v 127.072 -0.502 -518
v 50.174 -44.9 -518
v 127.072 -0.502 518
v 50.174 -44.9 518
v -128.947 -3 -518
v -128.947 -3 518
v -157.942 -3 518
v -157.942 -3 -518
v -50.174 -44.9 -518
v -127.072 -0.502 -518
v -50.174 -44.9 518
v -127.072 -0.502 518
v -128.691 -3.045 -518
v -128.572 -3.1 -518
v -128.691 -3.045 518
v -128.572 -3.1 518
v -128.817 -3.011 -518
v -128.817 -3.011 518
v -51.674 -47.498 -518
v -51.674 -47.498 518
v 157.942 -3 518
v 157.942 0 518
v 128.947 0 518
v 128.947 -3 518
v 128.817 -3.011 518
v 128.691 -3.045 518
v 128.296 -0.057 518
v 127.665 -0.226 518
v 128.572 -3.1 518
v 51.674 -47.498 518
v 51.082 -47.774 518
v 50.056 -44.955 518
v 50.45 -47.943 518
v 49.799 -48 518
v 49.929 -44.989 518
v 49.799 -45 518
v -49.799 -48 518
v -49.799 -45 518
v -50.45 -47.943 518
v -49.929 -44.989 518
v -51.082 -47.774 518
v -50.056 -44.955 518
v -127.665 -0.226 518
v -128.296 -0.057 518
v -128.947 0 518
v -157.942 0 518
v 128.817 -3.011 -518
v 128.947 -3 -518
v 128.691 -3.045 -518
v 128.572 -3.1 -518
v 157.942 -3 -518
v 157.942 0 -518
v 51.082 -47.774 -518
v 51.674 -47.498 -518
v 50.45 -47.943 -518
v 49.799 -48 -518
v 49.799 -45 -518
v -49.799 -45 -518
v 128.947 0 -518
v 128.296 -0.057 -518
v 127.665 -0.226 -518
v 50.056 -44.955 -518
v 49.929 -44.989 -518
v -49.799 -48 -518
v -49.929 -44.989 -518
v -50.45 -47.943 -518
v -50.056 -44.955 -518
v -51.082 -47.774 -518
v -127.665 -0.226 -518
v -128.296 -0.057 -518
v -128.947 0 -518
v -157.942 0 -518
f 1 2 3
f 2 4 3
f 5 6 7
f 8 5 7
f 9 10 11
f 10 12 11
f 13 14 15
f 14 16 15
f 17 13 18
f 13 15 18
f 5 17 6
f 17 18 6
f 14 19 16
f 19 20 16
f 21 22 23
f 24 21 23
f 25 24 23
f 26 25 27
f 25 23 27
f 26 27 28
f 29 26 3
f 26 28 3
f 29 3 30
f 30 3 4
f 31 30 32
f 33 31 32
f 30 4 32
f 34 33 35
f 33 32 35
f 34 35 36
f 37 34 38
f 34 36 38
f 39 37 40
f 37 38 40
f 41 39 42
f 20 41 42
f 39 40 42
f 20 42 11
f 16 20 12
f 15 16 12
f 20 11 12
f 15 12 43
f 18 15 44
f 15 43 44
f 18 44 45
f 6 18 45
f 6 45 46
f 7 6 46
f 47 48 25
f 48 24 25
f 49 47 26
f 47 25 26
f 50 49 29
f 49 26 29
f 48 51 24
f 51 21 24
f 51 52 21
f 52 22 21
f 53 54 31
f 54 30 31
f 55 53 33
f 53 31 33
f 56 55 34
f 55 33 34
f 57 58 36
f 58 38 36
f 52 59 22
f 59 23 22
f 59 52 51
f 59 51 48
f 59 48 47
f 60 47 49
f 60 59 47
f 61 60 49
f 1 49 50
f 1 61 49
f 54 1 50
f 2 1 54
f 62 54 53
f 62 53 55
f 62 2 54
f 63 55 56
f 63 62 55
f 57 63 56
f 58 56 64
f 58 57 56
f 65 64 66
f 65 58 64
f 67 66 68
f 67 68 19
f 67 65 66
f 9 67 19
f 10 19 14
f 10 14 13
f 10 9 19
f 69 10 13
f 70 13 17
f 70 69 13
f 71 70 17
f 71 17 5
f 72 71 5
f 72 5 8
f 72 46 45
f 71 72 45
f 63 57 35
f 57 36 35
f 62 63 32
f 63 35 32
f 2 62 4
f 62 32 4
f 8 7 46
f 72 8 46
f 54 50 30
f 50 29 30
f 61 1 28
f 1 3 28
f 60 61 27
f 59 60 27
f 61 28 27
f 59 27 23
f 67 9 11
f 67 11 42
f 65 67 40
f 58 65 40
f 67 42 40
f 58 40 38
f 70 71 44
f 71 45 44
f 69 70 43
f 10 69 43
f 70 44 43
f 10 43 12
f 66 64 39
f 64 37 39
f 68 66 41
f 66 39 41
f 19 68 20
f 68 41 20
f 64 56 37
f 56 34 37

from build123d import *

# Parameters (mm, degrees)
SM_BASE_FLANGE_1_DEPTH = 518


# Sheet-metal steps are written as plain solids
with BuildPart() as part:
    # Sketch 1 → Базовая кромка1 (new body)
    with BuildSketch(Plane.XY):
        with BuildLine():
            Line((-157.942286341, 0), (-128.947095812, 0))
            ThreePointArc((-128.947095812, 0), (-127.976524393, -0.127778151), (-127.072095812, -0.502404736))
            Line((-127.072095812, -0.502404736), (-50.174038106, -44.899519053))
            ThreePointArc((-50.174038106, -44.899519053), (-49.99315239, -44.97444437), (-49.799038106, -45))
            Line((-49.799038106, -45), (49.799038106, -45))
            ThreePointArc((49.799038106, -45), (49.99315239, -44.97444437), (50.174038106, -44.899519053))
            Line((50.174038106, -44.899519053), (127.072095812, -0.502404736))
            ThreePointArc((127.072095812, -0.502404736), (127.976524393, -0.127778151), (128.947095812, 0))
            Line((128.947095812, 0), (157.942286341, 0))
            Line((157.942286341, 0), (157.942286341, -3))
            Line((157.942286341, -3), (128.947095812, -3))
            ThreePointArc((128.947095812, -3), (128.752981528, -3.02555563), (128.572095812, -3.100480947))
            Line((128.572095812, -3.100480947), (51.674038106, -47.497595264))
            ThreePointArc((51.674038106, -47.497595264), (50.769609525, -47.872221849), (49.799038106, -48))
            Line((49.799038106, -48), (-49.799038106, -48))
            ThreePointArc((-49.799038106, -48), (-50.769609525, -47.872221849), (-51.674038106, -47.497595264))
            Line((-51.674038106, -47.497595264), (-128.572095812, -3.100480947))
            ThreePointArc((-128.572095812, -3.100480947), (-128.752981528, -3.02555563), (-128.947095812, -3))
            Line((-128.947095812, -3), (-157.942286341, -3))
            Line((-157.942286341, -3), (-157.942286341, 0))
        make_face()
    extrude(amount=SM_BASE_FLANGE_1_DEPTH)

    # Зеркальное отражение1: part across plane


with BuildPart() as part_1:
    add(part.part)
    add(part.part.mirror(Plane(origin=(51.674038106, -47.497595264, 0), x_dir=(1, 0, 0), z_dir=(0, 0, -1))))


solid = part_1.part
